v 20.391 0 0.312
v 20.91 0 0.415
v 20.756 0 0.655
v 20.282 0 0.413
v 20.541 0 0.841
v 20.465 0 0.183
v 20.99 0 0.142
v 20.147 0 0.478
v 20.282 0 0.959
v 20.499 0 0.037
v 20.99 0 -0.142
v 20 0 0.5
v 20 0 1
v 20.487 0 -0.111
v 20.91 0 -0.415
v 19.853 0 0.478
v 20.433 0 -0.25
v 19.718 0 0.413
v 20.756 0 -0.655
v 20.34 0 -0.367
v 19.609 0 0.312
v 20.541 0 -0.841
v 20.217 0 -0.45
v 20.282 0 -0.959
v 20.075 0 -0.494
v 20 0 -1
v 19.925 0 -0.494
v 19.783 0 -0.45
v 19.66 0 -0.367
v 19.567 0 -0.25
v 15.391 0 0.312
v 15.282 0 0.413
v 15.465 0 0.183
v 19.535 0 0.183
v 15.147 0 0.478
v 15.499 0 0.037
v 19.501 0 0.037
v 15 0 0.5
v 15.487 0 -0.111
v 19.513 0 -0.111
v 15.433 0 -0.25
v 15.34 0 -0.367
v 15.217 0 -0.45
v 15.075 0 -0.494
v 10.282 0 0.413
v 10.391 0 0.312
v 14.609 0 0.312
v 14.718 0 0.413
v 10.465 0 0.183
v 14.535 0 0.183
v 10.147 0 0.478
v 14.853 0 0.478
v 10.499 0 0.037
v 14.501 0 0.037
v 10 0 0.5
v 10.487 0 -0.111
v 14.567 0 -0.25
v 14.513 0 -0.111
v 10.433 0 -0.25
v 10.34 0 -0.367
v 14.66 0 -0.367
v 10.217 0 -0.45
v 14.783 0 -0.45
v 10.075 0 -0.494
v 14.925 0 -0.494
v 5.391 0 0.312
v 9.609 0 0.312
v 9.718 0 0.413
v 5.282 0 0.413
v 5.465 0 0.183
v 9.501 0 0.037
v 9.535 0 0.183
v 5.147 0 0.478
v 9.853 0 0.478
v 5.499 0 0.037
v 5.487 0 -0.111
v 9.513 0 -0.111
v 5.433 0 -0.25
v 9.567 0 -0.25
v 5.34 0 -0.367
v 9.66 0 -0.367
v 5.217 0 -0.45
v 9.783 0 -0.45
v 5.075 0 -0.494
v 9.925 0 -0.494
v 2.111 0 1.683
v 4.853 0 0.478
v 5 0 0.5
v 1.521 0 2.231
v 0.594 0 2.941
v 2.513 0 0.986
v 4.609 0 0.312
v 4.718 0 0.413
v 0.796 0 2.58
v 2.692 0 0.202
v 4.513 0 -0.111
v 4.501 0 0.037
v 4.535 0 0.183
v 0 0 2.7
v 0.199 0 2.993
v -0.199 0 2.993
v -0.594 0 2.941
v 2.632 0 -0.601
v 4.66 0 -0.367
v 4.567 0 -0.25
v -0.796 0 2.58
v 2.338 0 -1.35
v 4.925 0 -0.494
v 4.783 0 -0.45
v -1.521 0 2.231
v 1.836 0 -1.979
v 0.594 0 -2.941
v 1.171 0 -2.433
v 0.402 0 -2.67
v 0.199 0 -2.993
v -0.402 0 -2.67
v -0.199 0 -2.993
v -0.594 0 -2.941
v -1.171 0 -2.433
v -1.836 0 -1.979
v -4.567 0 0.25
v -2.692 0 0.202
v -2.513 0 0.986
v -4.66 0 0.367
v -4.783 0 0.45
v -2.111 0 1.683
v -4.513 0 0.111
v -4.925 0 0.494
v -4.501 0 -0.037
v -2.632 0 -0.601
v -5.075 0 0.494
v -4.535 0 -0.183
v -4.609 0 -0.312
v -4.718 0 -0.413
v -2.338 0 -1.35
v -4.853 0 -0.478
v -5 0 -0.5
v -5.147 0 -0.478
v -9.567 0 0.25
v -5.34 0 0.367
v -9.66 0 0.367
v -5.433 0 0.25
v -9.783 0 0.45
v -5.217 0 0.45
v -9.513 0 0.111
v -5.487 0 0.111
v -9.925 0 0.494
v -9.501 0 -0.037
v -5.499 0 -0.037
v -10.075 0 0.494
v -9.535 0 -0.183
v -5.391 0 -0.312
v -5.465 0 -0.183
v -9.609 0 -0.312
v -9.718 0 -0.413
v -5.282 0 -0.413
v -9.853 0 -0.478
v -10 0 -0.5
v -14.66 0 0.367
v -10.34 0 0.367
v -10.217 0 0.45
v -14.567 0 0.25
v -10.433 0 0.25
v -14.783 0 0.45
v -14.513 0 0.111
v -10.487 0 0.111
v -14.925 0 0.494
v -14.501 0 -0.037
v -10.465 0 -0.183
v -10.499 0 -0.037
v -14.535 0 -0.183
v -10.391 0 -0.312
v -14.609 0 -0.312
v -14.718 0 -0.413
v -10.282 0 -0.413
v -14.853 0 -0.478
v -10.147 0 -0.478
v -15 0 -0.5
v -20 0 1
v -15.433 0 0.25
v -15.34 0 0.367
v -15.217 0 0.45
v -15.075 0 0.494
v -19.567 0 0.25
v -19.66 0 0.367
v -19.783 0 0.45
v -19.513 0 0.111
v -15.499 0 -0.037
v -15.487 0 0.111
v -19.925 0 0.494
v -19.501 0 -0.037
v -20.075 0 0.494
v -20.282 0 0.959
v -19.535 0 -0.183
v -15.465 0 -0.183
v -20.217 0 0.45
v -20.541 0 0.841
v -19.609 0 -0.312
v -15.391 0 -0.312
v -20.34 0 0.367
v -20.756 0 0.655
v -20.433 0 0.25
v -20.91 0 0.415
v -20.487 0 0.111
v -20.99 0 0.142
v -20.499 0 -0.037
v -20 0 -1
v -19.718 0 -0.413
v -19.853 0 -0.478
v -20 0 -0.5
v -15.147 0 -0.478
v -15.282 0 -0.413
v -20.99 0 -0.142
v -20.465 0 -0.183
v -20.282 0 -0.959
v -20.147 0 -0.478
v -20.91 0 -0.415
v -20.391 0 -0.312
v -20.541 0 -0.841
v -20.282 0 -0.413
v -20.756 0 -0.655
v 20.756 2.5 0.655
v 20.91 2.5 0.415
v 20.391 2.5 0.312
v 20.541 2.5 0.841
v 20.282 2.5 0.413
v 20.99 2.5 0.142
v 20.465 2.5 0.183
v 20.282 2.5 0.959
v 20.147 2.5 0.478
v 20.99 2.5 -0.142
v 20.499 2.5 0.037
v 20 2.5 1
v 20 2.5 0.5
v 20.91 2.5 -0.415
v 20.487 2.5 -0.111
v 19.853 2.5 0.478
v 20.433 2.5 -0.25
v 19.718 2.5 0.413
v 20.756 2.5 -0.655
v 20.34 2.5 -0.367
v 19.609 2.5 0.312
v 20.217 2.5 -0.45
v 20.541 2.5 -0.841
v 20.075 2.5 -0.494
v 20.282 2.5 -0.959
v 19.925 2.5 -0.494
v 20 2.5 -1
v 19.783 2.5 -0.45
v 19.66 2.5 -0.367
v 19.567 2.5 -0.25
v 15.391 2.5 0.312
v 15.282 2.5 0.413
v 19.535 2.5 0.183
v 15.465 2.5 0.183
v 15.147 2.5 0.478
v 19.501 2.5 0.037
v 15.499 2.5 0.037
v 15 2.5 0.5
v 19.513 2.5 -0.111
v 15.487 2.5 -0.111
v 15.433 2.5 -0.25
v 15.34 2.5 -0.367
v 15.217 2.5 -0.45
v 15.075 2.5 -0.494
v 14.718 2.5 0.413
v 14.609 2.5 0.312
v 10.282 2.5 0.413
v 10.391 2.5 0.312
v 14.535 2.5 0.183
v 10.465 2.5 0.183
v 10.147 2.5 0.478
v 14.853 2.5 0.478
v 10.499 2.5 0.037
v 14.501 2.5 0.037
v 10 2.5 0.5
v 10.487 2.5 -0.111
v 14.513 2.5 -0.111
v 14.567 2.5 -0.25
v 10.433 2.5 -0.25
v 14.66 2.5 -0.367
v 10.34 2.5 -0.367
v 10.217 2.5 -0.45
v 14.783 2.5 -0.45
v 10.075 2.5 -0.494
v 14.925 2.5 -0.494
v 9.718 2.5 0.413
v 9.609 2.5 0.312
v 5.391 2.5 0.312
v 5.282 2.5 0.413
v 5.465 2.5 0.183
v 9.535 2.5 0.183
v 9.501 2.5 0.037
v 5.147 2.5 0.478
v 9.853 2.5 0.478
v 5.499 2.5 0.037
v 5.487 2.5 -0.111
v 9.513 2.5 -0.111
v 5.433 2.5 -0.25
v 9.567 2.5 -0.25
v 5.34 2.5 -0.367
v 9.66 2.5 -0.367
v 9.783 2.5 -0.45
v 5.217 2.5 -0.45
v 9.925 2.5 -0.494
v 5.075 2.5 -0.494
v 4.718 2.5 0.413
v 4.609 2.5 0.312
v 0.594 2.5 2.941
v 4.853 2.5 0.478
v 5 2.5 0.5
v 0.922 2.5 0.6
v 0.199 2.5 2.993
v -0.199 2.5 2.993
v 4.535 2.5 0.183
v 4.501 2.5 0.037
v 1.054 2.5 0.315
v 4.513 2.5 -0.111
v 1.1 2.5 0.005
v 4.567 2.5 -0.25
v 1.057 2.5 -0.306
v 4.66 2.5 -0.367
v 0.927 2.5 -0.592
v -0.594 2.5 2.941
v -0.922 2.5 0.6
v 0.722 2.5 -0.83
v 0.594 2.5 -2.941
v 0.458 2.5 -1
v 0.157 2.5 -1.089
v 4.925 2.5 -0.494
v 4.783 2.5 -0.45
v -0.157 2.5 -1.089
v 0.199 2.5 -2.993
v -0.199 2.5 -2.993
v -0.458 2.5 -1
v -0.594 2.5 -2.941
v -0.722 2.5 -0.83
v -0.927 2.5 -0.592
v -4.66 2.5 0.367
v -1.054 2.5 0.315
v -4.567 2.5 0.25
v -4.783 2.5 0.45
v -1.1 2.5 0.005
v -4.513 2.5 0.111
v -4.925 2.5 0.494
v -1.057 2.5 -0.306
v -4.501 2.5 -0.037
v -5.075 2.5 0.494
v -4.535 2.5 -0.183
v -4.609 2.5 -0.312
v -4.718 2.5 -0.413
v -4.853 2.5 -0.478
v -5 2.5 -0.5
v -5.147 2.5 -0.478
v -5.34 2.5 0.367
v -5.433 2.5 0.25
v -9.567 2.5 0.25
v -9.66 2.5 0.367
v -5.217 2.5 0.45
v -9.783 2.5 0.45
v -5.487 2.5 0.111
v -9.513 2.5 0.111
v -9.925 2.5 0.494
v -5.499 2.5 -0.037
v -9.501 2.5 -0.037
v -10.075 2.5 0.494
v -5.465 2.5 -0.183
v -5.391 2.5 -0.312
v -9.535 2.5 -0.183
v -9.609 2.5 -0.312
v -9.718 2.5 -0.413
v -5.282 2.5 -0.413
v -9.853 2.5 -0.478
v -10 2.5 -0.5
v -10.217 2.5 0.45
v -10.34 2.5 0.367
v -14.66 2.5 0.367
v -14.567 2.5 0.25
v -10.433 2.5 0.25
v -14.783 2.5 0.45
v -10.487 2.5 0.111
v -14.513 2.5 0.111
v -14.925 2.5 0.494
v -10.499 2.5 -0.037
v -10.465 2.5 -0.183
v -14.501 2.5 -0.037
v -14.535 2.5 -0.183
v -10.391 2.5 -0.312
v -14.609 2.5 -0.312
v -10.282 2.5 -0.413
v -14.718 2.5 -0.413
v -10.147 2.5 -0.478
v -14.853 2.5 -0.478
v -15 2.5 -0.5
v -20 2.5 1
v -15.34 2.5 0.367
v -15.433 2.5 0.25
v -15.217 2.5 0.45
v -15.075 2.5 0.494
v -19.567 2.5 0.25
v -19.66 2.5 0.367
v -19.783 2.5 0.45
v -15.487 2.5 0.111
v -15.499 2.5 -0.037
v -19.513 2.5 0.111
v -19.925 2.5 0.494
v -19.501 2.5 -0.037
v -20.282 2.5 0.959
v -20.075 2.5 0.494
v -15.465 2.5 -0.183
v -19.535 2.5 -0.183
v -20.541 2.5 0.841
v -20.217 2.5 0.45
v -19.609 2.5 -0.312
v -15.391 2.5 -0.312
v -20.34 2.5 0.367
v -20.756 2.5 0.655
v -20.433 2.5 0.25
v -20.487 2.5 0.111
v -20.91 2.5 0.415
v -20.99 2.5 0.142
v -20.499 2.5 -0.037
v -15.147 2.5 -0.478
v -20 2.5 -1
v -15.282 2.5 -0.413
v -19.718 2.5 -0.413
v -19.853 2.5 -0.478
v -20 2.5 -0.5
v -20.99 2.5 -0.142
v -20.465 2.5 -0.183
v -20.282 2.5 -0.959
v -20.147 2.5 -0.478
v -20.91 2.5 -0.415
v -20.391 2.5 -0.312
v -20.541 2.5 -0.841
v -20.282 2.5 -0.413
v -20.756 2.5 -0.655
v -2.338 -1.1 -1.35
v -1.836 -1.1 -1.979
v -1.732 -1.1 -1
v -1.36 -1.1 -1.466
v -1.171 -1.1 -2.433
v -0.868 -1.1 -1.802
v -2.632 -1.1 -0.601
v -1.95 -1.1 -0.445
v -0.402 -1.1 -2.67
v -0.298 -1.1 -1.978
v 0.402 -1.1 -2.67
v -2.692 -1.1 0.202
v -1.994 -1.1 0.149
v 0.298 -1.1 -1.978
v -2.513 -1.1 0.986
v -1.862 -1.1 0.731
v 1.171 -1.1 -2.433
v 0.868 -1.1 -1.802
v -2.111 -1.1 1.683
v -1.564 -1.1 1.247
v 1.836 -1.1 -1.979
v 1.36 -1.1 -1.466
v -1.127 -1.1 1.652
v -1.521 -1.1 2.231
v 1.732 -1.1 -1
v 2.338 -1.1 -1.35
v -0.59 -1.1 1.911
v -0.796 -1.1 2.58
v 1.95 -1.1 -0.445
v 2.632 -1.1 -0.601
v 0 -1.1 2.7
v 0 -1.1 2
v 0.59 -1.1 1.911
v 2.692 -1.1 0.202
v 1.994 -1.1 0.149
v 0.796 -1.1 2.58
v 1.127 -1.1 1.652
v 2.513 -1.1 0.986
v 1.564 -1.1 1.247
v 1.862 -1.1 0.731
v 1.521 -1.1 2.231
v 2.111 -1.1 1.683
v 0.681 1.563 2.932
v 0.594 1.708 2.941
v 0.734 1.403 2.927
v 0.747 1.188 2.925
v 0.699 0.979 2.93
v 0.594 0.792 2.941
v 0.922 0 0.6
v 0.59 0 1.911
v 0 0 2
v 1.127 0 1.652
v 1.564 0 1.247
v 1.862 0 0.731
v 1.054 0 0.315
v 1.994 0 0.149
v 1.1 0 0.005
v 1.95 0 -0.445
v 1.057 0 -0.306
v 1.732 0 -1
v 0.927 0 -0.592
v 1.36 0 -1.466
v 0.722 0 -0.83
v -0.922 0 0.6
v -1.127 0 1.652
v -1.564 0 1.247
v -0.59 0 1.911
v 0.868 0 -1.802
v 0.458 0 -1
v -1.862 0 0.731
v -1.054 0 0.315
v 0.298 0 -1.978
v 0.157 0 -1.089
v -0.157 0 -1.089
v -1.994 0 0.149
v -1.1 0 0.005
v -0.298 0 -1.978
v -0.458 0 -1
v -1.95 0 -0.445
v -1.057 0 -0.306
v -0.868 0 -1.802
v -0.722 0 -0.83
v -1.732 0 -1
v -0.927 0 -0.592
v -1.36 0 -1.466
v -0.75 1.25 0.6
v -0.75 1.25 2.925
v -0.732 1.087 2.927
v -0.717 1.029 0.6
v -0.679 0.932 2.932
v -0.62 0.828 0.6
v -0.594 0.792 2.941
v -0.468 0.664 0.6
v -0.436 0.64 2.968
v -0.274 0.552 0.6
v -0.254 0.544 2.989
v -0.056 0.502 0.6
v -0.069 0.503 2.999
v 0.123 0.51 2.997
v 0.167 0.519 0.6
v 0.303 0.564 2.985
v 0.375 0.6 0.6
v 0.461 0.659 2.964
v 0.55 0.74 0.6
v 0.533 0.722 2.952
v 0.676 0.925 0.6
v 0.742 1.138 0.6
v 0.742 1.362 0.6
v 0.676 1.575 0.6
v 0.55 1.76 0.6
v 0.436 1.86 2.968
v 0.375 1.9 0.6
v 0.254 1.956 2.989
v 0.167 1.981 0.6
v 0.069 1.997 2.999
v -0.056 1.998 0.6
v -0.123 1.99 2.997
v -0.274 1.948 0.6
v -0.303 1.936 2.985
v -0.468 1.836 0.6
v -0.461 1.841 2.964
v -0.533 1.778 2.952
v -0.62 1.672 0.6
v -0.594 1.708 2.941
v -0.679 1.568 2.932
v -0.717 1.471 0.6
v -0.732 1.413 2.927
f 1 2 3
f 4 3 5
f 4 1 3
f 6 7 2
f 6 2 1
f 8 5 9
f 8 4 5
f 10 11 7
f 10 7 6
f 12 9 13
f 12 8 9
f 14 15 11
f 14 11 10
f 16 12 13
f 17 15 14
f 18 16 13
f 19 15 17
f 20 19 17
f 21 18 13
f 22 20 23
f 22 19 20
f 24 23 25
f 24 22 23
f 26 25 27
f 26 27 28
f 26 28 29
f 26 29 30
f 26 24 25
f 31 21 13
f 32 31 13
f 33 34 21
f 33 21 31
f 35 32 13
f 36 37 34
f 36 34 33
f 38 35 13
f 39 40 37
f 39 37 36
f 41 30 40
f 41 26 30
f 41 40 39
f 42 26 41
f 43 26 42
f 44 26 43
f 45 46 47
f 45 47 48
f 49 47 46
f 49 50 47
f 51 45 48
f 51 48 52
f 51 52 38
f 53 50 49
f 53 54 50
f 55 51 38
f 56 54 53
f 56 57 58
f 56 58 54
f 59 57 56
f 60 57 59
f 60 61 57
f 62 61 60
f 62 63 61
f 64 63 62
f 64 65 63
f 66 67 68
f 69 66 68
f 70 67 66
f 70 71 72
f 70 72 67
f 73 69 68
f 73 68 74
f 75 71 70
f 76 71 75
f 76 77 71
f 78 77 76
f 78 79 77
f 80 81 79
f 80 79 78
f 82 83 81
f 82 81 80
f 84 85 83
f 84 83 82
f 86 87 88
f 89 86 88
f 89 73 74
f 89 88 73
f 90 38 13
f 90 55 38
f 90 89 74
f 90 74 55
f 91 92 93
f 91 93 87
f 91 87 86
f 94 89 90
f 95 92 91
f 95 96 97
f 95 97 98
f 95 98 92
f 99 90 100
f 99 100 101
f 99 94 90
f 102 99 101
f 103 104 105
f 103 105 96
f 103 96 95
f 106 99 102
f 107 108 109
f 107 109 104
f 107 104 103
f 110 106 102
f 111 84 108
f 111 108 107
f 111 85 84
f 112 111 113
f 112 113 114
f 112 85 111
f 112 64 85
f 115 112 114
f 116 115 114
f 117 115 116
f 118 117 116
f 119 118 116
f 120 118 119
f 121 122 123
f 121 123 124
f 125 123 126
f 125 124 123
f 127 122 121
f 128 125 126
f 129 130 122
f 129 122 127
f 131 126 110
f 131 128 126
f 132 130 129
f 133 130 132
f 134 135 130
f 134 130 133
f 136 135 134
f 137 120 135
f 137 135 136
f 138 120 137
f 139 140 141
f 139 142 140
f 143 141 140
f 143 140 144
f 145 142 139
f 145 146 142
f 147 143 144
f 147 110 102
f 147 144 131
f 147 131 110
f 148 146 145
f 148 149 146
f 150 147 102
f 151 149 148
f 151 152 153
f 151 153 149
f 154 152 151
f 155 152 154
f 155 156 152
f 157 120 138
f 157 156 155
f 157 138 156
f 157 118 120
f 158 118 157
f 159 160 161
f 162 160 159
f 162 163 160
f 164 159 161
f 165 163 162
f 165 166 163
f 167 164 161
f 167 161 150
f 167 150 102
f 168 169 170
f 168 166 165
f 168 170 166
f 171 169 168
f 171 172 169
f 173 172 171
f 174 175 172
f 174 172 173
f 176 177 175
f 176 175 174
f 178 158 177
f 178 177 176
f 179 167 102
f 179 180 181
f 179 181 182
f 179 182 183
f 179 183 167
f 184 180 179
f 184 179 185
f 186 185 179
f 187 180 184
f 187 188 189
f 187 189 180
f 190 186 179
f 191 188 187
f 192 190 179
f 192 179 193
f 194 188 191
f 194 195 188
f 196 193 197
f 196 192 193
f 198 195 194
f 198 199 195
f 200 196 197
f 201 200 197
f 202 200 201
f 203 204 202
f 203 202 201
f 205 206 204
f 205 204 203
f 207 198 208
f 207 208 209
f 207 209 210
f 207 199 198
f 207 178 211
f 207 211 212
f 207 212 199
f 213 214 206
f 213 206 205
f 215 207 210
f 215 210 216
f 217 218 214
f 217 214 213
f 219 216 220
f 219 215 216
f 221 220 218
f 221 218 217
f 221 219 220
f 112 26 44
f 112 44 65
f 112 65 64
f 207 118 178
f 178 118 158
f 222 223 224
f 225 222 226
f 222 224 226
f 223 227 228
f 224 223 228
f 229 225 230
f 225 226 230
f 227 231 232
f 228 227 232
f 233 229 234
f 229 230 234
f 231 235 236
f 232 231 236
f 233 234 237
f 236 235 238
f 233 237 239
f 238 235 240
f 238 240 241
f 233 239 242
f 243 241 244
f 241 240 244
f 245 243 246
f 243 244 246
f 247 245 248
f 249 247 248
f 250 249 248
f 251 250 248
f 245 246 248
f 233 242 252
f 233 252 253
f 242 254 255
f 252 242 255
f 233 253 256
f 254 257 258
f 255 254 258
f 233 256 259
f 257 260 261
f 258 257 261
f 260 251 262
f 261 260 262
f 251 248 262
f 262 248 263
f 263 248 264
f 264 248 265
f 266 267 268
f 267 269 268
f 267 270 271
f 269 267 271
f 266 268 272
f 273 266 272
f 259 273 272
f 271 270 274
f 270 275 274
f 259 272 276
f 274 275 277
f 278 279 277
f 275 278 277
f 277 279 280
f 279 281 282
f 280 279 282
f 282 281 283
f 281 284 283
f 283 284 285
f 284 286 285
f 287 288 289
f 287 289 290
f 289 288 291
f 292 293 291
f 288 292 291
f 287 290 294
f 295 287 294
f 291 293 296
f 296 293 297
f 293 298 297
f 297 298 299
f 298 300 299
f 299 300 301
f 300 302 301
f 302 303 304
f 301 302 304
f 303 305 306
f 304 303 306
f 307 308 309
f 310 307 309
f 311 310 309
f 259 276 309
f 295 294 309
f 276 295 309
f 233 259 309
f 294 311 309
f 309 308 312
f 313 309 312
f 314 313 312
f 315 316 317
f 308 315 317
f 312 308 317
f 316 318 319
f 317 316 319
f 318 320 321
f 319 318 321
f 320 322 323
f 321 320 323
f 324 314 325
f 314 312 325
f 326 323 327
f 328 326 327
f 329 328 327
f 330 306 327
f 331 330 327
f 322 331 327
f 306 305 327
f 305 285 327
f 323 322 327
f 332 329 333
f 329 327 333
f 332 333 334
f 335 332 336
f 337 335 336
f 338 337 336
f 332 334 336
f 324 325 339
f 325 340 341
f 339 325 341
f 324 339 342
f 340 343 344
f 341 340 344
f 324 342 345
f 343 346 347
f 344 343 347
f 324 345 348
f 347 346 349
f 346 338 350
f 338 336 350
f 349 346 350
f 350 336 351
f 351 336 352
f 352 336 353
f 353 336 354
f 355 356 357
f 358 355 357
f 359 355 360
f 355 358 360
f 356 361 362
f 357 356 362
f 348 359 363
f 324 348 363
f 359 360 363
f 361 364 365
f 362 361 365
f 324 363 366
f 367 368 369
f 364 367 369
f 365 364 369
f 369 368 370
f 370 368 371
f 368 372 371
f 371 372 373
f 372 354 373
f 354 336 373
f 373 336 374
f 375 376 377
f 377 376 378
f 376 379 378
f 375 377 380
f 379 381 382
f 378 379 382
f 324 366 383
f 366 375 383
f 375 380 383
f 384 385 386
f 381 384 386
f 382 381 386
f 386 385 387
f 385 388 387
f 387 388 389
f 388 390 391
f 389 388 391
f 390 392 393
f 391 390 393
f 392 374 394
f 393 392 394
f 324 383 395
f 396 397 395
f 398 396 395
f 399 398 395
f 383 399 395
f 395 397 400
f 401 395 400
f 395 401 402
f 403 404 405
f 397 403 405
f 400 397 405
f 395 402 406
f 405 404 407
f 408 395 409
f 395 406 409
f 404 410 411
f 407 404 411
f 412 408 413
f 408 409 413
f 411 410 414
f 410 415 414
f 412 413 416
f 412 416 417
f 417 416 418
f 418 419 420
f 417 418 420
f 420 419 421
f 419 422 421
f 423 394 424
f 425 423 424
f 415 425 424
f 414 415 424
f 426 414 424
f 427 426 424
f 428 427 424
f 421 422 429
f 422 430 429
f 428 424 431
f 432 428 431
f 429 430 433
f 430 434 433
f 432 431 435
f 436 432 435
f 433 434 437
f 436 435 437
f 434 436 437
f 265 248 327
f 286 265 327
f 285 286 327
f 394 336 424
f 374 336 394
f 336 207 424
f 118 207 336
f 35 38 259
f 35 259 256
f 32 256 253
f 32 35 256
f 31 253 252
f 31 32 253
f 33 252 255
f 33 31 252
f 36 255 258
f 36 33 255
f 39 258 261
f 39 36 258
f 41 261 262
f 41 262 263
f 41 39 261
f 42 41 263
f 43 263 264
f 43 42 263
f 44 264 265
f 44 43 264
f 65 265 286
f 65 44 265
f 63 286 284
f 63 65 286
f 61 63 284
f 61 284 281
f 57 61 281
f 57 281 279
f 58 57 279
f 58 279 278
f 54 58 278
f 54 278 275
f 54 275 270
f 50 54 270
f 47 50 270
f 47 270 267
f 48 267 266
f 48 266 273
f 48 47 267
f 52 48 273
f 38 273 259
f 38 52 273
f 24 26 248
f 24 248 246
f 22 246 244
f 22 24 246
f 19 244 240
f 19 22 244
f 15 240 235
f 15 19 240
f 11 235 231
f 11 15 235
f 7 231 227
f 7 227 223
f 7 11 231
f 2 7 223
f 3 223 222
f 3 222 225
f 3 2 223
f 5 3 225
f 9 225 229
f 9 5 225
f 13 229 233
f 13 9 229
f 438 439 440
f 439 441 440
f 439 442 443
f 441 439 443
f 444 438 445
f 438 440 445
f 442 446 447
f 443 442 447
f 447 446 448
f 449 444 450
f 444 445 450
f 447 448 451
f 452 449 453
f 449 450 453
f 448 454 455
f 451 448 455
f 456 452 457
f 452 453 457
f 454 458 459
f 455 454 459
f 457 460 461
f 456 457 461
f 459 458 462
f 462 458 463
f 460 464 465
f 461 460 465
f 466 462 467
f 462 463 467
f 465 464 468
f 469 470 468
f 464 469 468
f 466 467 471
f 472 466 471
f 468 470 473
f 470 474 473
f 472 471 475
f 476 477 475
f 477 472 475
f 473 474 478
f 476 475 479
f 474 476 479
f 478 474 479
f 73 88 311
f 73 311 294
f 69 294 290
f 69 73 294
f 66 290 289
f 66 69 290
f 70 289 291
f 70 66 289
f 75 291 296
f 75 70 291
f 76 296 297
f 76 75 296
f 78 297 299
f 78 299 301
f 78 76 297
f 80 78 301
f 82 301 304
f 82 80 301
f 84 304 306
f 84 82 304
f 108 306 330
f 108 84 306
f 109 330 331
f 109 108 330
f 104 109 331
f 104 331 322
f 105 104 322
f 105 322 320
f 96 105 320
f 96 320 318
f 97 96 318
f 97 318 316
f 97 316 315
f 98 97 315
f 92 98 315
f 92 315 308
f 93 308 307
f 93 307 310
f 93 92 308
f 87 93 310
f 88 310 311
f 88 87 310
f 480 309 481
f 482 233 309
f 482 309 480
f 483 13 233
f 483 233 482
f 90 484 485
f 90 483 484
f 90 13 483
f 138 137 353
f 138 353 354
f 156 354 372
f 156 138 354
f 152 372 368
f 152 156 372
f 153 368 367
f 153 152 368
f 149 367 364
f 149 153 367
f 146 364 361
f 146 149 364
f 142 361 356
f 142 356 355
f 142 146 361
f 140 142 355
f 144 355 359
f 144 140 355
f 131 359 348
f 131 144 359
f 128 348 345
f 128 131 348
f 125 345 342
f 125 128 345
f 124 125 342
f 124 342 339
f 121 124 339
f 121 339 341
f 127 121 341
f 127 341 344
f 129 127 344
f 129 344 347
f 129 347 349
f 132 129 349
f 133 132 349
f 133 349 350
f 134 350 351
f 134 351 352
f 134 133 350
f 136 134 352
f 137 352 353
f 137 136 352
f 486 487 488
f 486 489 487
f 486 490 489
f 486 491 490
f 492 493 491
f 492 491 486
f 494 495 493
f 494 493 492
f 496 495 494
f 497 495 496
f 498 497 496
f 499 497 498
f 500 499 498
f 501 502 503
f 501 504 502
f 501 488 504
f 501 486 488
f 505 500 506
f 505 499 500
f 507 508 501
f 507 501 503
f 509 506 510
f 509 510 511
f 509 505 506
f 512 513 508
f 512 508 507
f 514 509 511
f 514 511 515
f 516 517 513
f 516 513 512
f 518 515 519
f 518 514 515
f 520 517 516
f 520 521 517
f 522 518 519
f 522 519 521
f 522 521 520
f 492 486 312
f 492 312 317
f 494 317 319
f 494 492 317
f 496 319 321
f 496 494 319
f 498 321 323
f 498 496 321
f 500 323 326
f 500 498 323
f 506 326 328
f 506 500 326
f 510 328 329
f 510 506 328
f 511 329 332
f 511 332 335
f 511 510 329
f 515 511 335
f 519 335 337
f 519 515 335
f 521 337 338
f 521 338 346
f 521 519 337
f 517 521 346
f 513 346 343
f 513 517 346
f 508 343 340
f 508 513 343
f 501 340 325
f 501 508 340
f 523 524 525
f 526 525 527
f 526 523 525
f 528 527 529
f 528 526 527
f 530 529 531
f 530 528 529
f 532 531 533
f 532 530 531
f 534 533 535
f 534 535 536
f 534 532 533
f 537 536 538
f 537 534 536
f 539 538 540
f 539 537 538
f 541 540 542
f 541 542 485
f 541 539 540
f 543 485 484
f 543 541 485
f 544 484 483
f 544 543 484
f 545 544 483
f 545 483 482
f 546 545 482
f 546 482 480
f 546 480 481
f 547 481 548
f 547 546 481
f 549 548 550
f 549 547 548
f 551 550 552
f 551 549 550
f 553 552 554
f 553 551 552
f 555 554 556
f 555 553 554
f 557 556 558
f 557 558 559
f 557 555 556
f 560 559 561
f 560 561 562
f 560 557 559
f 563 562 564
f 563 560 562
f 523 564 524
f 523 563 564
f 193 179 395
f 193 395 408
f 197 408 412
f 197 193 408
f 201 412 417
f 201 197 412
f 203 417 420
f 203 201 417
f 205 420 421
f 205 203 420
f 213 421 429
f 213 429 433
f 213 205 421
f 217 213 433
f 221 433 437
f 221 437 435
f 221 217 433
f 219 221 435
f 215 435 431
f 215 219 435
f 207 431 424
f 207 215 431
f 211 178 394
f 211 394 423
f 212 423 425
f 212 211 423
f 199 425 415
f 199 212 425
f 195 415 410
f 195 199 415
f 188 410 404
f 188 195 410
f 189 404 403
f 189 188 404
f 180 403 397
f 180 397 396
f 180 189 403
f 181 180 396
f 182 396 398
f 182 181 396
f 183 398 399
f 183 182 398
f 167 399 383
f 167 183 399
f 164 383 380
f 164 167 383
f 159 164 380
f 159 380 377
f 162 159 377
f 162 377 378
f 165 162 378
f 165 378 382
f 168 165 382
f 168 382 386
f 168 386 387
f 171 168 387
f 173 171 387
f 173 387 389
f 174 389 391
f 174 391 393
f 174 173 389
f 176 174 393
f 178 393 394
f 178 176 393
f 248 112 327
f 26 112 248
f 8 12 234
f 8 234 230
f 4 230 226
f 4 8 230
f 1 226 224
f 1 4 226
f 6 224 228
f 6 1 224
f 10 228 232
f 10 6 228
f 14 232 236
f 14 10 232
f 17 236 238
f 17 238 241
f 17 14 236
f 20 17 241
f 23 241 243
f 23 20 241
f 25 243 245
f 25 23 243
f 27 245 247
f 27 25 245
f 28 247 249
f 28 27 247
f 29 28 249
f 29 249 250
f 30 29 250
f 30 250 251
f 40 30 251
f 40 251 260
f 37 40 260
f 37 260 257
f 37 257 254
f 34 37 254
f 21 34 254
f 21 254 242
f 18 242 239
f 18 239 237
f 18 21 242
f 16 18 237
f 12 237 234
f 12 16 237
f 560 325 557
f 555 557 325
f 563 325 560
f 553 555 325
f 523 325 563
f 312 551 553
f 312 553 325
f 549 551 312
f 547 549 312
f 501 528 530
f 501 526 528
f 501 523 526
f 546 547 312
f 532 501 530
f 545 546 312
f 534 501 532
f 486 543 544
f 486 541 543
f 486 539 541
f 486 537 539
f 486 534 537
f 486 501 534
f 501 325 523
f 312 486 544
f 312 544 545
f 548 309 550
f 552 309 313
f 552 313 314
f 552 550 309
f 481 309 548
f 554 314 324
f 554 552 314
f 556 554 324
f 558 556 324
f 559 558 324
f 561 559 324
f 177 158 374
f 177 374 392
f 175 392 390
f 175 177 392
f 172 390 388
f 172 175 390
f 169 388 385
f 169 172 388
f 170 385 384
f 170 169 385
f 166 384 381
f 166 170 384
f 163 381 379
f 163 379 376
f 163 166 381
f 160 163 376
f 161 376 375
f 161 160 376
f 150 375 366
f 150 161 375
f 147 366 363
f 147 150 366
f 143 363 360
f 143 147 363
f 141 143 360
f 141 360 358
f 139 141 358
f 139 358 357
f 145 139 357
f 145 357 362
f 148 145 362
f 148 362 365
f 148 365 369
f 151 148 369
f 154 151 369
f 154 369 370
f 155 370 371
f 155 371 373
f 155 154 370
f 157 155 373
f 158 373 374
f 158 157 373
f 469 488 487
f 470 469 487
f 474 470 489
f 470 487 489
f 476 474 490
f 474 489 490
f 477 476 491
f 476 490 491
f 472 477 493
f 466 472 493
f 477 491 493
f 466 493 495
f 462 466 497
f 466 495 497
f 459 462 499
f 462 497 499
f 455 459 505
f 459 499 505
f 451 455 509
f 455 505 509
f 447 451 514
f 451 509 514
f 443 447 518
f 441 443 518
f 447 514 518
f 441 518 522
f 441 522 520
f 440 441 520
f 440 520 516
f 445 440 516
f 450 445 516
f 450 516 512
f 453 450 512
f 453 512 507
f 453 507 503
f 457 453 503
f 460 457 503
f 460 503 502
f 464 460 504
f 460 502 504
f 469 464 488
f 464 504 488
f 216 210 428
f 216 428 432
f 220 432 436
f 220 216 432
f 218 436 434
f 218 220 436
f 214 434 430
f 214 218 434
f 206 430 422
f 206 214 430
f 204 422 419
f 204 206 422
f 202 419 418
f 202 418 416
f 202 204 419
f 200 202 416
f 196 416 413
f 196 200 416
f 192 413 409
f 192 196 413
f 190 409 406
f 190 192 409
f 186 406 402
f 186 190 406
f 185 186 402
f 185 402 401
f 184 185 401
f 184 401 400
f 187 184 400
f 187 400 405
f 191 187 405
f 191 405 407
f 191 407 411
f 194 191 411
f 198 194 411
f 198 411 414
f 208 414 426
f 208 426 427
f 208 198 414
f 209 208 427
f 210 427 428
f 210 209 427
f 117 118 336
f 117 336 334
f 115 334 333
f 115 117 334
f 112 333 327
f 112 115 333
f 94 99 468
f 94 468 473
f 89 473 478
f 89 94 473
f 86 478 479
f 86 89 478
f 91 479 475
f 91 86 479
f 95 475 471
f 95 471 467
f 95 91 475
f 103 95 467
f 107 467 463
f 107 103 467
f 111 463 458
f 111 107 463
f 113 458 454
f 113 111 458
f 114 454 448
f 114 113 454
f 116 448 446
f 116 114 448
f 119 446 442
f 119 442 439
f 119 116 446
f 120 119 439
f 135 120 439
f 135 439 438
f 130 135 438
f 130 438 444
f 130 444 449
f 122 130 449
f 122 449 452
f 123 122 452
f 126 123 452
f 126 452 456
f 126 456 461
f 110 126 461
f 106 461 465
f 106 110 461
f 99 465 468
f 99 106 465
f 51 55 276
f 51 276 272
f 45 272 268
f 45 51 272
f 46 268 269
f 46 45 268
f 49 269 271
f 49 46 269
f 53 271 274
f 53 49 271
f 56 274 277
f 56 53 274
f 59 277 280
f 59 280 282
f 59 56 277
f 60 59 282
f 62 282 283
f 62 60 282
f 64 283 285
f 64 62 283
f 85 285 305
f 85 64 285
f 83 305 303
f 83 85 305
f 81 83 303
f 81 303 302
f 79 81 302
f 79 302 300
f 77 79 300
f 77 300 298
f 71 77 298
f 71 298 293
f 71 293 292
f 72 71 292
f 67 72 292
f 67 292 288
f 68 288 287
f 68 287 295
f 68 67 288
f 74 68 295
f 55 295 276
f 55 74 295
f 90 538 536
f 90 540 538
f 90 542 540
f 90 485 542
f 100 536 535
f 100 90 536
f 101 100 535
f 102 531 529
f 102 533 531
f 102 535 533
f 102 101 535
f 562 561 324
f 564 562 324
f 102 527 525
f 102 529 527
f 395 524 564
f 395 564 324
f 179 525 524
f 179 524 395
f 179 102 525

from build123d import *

# Parameters (mm, degrees)
SKETCH1_R           = 0.5
BOSS_EXTRUDE1_DEPTH = 2.5
SKETCH2_R           = 0.75
CUT_EXTRUDE1_DEPTH  = 9
SKETCH3_R           = 2.7
SKETCH3_R_2         = 2
BOSS_EXTRUDE2_DEPTH = 1.1


with BuildPart() as part:
    # Sketch1 → Boss-Extrude1 (new body)
    with BuildSketch(Plane(origin=(0, 0, 0), x_dir=(1, 0, 0), z_dir=(0, 1, 0))):
        with BuildLine():
            Line((0.594059406, 2.940594059), (20, 1))
            ThreePointArc((20, 1), (21, 0), (20, -1))
            Line((20, -1), (0.594059406, -2.940594059))
            ThreePointArc((0.594059406, -2.940594059), (0, -3), (-0.594059406, -2.940594059))
            Line((-0.594059406, -2.940594059), (-20, -1))
            ThreePointArc((-20, -1), (-21, 0), (-20, 1))
            Line((-20, 1), (-0.594059406, 2.940594059))
            ThreePointArc((-0.594059406, 2.940594059), (0, 3), (0.594059406, 2.940594059))
        make_face()
        with Locations(Location((5, 0, 0), (0, 0, 270))):
            Circle(SKETCH1_R, mode=Mode.SUBTRACT)
        with Locations(Location((10, 0, 0), (0, 0, 270))):
            Circle(SKETCH1_R, mode=Mode.SUBTRACT)
        with Locations(Location((15, 0, 0), (0, 0, 270))):
            Circle(SKETCH1_R, mode=Mode.SUBTRACT)
        with Locations(Location((20, 0, 0), (0, 0, 270))):
            Circle(SKETCH1_R, mode=Mode.SUBTRACT)
        with Locations(Location((-20, 0, 0), (0, 0, 90))):
            Circle(SKETCH1_R, mode=Mode.SUBTRACT)
        with Locations(Location((-15, 0, 0), (0, 0, 90))):
            Circle(SKETCH1_R, mode=Mode.SUBTRACT)
        with Locations(Location((-10, 0, 0), (0, 0, 90))):
            Circle(SKETCH1_R, mode=Mode.SUBTRACT)
        with Locations(Location((-5, 0, 0), (0, 0, 90))):
            Circle(SKETCH1_R, mode=Mode.SUBTRACT)
        with BuildLine():
            Line((-0.921954446, -0.6), (0.921954446, -0.6))
            ThreePointArc((0.921954446, -0.6), (0, 1.1), (-0.921954446, -0.6))
        make_face(mode=Mode.SUBTRACT)
    extrude(amount=BOSS_EXTRUDE1_DEPTH)

    # Sketch2 → Cut-Extrude1 (cut)
    with BuildSketch(Plane.XY):
        with Locations(Location((0, 1.25, 0), (0, 0, 180))):
            Circle(SKETCH2_R)
    extrude(amount=CUT_EXTRUDE1_DEPTH, mode=Mode.SUBTRACT)

    # Sketch3 → Boss-Extrude2 (add)
    with BuildSketch(Plane(origin=(0, 0, 0), x_dir=(1, 0, 0), z_dir=(0, 1, 0))):
        with Locations(Location((0, 0, 0), (0, 0, 270))):
            Circle(SKETCH3_R)
        with Locations(Location((0, 0, 0), (0, 0, 270))):
            Circle(SKETCH3_R_2, mode=Mode.SUBTRACT)
    extrude(amount=-BOSS_EXTRUDE2_DEPTH)


solid = part.part
